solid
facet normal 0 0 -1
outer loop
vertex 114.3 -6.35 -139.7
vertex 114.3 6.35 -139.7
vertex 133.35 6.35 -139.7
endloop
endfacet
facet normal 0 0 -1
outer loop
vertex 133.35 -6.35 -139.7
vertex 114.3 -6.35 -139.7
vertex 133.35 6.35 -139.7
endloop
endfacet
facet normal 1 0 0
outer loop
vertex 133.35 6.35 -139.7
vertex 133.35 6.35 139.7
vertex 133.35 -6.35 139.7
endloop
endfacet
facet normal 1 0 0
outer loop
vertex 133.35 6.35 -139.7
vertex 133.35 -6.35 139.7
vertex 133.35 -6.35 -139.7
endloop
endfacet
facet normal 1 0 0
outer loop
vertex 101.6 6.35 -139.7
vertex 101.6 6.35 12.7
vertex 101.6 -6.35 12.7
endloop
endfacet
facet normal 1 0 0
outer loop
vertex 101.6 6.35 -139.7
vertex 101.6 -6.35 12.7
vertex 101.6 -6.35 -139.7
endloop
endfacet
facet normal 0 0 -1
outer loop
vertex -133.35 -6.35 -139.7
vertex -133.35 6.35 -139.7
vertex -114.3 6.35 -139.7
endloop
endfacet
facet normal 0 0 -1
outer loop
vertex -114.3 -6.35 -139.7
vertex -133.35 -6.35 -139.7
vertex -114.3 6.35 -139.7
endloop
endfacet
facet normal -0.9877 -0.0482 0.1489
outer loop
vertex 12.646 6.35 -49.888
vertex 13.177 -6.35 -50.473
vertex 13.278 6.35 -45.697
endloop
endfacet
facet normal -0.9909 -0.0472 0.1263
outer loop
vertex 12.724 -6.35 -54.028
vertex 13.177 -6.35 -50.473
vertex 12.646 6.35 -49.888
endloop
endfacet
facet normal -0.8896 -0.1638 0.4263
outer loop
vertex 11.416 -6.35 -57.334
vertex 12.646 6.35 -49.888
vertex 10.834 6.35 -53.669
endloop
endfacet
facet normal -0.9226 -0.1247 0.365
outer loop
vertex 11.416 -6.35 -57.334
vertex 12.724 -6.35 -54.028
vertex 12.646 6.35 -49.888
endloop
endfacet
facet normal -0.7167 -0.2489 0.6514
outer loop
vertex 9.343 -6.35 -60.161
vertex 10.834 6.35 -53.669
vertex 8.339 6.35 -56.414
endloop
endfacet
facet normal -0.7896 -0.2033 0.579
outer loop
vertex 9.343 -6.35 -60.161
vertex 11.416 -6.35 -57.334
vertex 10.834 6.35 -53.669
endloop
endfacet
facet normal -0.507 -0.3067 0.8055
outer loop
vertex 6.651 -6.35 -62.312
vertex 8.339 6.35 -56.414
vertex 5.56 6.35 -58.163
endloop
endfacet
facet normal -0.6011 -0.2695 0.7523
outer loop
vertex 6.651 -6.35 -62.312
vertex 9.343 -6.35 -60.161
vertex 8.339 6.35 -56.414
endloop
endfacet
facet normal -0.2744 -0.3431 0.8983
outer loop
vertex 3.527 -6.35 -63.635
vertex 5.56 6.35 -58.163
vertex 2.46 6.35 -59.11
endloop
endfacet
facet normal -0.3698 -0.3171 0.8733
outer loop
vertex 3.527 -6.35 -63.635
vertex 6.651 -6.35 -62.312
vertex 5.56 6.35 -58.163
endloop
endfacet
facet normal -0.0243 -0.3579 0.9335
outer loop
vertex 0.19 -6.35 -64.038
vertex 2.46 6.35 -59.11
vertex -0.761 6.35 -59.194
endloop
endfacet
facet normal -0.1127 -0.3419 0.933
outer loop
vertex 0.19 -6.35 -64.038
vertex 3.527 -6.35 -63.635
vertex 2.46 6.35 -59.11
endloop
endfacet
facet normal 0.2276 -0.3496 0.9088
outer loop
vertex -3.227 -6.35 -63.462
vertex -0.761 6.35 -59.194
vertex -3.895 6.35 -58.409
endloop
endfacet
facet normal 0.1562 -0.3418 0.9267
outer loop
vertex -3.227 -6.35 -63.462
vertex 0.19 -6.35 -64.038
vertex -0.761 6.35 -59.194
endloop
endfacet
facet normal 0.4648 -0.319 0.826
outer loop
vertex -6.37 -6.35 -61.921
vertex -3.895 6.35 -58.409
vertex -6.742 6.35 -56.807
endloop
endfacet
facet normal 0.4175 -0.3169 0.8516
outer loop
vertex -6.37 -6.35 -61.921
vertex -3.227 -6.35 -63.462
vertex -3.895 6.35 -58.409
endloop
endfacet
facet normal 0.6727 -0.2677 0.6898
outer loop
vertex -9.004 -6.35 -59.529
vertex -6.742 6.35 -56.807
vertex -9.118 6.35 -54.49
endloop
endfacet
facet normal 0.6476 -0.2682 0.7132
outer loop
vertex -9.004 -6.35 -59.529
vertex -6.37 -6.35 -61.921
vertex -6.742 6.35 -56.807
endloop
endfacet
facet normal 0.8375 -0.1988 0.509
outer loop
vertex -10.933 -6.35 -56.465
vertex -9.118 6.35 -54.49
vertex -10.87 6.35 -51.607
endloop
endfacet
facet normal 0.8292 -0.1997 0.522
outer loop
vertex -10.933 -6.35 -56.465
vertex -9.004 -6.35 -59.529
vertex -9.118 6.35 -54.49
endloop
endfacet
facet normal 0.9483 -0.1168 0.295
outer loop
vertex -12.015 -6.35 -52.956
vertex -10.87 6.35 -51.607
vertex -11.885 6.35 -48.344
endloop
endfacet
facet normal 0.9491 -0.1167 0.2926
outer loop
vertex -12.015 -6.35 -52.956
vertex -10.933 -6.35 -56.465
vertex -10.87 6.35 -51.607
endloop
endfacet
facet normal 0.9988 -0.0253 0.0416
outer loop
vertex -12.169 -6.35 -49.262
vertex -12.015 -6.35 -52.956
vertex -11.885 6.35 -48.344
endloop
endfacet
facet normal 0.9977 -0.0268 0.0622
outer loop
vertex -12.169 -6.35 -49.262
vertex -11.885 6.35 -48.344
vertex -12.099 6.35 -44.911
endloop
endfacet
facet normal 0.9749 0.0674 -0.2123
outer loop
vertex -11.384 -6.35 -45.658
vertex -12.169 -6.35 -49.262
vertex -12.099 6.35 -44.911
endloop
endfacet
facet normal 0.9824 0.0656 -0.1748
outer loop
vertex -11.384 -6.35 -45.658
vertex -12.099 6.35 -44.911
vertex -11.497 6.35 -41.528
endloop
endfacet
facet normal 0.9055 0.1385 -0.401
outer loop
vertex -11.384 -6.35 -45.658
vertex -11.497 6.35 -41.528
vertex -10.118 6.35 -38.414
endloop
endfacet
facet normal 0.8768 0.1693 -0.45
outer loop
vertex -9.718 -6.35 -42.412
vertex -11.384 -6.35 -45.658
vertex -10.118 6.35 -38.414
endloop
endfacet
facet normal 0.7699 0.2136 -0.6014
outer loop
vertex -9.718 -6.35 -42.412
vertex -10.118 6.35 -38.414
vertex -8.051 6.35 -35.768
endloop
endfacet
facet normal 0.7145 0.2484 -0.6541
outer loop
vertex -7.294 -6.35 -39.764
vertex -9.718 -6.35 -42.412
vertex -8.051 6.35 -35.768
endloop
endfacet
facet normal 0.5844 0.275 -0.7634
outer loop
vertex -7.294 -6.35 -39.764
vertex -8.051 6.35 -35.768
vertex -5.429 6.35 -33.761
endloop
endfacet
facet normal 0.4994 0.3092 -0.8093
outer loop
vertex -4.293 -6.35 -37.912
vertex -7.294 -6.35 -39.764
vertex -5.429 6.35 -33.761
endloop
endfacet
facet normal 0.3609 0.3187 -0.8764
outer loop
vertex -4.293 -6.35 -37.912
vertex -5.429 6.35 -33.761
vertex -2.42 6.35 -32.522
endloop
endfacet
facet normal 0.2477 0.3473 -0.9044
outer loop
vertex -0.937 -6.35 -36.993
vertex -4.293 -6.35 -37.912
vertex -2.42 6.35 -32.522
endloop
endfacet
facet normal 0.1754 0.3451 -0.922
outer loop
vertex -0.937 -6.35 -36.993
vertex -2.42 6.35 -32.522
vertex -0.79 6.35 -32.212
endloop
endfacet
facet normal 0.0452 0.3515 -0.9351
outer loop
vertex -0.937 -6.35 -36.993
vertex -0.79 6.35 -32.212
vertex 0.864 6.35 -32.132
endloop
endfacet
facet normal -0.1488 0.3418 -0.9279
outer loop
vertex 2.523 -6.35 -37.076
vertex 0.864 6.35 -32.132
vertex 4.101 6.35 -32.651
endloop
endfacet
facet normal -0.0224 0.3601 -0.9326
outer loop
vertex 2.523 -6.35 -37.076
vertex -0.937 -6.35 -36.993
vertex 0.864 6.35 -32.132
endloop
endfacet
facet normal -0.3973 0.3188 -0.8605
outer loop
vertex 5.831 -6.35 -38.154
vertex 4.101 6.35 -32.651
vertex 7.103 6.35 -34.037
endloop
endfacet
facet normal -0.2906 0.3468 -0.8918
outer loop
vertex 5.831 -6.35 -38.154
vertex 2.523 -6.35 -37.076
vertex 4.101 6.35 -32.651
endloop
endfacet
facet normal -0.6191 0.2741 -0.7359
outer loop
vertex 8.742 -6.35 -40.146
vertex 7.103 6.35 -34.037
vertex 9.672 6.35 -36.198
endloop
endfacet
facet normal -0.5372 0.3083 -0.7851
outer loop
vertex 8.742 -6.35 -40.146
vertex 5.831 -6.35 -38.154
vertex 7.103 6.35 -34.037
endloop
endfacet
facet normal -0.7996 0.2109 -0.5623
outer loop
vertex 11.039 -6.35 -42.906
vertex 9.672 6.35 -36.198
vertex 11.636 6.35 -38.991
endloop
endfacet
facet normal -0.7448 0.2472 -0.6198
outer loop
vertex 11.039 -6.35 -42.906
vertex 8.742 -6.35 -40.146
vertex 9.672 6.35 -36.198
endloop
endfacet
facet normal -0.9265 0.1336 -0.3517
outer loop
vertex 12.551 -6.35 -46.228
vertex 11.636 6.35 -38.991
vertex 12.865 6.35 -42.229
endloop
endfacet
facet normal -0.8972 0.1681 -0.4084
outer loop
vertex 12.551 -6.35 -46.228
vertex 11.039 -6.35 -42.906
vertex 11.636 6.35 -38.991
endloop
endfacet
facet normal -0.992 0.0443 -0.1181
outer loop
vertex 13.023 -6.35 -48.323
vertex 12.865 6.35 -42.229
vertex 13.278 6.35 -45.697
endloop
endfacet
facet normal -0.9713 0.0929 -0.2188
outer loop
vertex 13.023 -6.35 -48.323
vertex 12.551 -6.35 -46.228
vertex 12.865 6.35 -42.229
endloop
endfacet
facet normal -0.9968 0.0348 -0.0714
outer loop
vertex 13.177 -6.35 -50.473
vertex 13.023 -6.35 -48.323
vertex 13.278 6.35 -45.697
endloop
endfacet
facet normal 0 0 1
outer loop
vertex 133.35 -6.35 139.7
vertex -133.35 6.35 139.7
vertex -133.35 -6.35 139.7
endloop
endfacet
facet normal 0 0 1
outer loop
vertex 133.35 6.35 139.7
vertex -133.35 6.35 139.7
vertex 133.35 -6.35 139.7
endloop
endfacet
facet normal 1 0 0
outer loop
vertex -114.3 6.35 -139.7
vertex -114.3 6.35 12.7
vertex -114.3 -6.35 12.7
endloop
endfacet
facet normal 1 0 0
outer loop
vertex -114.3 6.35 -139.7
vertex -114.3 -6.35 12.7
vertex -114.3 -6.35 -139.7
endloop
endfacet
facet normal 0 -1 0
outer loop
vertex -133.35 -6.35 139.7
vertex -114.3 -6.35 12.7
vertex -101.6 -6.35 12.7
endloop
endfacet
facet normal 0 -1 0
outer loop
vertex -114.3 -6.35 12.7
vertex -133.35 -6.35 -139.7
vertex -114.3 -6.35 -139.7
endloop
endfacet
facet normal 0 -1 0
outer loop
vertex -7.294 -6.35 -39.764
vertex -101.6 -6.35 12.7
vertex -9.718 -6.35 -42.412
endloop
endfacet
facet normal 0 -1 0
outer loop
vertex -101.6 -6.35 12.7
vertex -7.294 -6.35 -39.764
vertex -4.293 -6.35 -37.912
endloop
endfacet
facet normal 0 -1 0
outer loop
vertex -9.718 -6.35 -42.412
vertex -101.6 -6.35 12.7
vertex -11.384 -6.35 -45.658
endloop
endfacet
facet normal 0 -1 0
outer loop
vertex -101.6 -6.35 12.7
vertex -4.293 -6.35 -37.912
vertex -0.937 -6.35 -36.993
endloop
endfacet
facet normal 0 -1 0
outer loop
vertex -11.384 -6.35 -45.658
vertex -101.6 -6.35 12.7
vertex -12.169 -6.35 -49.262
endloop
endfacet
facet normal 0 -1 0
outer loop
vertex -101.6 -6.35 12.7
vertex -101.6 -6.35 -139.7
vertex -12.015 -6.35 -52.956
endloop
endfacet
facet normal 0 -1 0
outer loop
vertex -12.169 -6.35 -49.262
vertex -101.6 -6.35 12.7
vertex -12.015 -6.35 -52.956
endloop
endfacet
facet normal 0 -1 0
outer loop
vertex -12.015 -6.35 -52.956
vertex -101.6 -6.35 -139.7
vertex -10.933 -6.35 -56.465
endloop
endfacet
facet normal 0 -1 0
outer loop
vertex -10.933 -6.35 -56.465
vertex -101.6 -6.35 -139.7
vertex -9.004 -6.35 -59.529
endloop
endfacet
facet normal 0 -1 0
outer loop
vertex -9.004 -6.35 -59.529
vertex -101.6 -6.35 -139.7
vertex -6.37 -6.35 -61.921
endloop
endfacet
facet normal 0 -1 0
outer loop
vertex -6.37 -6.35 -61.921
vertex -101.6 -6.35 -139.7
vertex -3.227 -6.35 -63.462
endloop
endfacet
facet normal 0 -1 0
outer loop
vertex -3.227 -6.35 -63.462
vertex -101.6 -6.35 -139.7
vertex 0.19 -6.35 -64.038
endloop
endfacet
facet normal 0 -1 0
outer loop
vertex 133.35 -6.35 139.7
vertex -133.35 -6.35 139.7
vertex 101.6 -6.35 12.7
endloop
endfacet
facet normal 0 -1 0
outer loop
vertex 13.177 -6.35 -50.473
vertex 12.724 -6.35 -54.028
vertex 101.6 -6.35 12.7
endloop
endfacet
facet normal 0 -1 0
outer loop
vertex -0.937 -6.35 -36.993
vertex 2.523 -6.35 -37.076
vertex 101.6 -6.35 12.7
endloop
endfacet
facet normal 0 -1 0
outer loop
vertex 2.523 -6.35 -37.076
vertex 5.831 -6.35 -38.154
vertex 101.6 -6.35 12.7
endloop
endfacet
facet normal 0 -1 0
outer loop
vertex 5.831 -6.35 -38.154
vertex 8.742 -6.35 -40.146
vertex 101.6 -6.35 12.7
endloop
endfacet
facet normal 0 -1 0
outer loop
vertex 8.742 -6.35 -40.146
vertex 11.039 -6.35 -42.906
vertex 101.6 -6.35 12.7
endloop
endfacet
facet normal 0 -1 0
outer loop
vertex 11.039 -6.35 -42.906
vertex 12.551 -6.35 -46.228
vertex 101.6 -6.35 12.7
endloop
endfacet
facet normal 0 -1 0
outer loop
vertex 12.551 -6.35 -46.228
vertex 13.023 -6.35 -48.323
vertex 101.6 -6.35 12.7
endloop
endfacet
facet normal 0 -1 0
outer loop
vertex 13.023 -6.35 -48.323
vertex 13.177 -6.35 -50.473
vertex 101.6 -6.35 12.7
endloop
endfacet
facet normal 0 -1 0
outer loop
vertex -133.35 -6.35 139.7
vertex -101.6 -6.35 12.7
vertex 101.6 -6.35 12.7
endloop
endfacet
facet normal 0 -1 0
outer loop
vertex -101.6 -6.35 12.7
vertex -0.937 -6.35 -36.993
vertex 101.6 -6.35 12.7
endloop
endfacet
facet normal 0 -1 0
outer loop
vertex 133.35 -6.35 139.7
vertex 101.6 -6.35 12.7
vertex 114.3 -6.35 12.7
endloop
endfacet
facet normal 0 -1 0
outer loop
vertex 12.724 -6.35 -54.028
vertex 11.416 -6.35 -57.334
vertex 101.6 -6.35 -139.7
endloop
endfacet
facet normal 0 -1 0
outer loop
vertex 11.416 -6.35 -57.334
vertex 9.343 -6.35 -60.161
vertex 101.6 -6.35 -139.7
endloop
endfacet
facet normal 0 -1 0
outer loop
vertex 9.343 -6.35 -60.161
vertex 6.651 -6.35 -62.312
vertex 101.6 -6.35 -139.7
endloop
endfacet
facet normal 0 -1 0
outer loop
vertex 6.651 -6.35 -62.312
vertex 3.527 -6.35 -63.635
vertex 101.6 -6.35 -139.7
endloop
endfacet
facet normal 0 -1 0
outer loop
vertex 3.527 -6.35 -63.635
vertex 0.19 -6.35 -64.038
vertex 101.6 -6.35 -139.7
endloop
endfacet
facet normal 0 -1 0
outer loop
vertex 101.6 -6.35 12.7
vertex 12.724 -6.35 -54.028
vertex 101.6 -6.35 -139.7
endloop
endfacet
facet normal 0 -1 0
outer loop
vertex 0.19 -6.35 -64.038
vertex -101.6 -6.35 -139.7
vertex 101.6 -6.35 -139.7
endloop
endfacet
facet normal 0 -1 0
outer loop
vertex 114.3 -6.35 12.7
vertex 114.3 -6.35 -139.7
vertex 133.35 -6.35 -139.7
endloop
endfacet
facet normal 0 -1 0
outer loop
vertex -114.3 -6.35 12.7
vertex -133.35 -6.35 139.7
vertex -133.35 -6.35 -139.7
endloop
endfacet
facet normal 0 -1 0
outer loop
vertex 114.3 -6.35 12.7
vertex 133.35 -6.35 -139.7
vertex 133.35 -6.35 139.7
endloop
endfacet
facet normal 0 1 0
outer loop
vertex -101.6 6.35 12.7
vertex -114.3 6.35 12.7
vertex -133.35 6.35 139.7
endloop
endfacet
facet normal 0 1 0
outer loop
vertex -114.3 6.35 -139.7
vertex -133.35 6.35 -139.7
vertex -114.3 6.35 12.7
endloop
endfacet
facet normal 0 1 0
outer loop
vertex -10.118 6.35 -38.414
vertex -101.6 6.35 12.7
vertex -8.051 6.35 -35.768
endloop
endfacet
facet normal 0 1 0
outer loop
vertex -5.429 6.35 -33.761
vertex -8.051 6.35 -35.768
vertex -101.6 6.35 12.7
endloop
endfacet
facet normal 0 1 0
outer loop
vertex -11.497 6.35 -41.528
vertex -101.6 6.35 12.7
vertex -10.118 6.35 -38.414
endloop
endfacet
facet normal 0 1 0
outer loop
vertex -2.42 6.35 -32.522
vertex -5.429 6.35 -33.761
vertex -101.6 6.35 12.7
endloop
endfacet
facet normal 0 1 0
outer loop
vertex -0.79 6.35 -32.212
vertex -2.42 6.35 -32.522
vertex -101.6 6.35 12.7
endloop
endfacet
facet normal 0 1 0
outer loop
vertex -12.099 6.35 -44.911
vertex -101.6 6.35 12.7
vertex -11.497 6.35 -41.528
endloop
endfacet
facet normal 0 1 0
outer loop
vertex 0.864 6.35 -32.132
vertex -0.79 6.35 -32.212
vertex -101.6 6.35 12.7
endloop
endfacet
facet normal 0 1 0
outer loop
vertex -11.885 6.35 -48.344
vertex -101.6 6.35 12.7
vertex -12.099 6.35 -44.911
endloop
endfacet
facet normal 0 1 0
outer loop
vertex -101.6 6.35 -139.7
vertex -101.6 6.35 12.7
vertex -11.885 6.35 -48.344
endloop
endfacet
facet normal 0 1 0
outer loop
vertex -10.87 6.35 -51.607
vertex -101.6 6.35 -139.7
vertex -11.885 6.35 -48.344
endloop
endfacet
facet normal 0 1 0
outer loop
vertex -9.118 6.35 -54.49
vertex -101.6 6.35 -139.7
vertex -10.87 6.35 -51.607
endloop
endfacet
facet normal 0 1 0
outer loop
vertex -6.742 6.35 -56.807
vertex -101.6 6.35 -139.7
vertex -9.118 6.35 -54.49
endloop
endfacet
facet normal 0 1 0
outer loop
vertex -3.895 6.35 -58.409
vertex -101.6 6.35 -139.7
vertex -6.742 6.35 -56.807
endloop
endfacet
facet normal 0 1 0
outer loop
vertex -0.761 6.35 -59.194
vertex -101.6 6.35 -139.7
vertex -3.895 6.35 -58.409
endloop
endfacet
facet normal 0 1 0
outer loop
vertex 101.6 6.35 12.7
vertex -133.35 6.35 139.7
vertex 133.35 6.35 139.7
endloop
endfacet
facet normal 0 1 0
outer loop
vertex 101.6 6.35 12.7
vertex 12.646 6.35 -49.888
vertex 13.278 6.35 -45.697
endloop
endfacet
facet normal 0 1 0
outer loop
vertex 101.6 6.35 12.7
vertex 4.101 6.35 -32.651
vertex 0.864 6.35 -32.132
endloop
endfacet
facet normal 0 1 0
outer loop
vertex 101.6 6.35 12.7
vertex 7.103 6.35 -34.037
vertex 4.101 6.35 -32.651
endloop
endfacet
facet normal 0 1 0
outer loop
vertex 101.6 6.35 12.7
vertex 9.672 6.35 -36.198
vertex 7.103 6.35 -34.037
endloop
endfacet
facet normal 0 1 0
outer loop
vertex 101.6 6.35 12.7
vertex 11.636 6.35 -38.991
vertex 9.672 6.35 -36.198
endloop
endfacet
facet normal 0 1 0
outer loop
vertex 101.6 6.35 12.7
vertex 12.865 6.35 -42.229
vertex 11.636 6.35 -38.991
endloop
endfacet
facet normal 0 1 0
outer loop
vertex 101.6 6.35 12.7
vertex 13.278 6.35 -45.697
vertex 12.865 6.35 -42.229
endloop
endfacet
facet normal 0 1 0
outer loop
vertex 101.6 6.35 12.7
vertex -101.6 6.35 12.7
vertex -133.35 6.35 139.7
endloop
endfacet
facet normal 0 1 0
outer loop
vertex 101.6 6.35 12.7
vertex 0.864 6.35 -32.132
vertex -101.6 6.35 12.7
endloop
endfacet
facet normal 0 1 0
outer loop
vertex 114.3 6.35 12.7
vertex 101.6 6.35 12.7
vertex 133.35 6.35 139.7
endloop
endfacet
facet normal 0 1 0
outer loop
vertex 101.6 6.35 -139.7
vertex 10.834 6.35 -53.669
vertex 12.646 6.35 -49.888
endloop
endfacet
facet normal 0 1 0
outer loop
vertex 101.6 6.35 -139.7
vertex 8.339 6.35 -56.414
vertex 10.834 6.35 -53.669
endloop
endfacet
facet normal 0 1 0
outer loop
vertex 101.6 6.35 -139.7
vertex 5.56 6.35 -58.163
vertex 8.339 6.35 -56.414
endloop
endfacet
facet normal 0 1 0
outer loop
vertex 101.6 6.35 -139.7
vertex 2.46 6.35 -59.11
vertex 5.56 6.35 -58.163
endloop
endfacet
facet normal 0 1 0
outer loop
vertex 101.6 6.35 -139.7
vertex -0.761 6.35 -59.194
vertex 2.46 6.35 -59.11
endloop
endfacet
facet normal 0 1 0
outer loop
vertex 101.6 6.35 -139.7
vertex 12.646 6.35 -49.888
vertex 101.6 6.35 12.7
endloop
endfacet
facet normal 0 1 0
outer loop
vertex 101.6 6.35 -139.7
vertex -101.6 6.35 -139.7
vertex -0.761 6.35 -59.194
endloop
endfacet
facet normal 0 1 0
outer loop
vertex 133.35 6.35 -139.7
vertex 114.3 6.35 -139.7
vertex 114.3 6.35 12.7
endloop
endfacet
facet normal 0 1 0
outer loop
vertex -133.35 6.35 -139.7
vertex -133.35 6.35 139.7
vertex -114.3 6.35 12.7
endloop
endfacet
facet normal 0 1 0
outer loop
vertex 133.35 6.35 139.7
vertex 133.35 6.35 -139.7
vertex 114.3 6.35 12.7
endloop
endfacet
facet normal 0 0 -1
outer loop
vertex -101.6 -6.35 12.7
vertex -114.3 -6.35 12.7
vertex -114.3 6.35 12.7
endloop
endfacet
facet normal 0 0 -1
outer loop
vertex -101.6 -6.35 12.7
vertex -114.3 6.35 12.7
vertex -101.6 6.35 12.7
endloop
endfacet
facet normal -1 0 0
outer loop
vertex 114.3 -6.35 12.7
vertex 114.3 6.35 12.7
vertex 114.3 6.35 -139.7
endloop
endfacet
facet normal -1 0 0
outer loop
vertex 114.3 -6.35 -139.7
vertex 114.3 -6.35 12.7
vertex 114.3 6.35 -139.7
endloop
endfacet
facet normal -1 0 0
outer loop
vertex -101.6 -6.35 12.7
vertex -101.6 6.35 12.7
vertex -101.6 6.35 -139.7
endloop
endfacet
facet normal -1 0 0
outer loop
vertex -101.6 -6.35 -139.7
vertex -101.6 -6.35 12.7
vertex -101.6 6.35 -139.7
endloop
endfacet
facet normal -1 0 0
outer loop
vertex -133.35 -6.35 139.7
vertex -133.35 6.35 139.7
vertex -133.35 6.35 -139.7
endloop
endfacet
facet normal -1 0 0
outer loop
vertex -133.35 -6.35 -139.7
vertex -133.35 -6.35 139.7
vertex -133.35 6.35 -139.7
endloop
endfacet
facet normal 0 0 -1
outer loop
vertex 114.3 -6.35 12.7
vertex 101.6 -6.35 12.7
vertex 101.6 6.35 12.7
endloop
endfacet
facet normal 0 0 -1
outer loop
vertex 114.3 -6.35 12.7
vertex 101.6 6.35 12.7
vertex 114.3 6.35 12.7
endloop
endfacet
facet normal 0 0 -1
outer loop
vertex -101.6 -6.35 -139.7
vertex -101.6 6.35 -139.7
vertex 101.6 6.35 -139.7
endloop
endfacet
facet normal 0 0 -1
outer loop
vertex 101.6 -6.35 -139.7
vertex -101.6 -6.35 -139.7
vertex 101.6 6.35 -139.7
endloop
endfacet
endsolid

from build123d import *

# Parameters (mm, degrees)
SKETCH1_W           = 330.2
SKETCH1_H           = 279.4
BOSS_EXTRUDE1_DEPTH = 6.35
SKETCH2_W           = 12.7
SKETCH2_H           = 152.4
CUT_EXTRUDE1_DEPTH  = 217.645770787
SKETCH4_W           = 31.75
SKETCH4_H           = 279.4
CUT_EXTRUDE3_DEPTH  = 217.645770787
CAVITY1_START       = -28.48121296
CAVITY1_OUTLINE_R   = 12.7
CAVITY1_DEPTH       = 23.121998378


# Read off the part's stored shape, not the designer's step: Cavity1
with BuildPart() as part:
    # Sketch1 → Boss-Extrude1 (new, symmetric)
    with BuildSketch(Plane(origin=(0, 0, 0), x_dir=(1, 0, 0), z_dir=(0, 1, 0))):
        Rectangle(SKETCH1_W, SKETCH1_H)
    extrude(amount=BOSS_EXTRUDE1_DEPTH, both=True)

    # Sketch2 → Cut-Extrude1 (cut, through all)
    with BuildSketch(Plane(origin=(0, 6.35, 0), x_dir=(1, 0, 0), z_dir=(0, 1, 0))):
        with Locations((-107.95, 63.5)):
            Rectangle(SKETCH2_W, SKETCH2_H)
        with Locations((107.95, 63.5)):
            Rectangle(SKETCH2_W, SKETCH2_H)
    extrude(amount=-CUT_EXTRUDE1_DEPTH, mode=Mode.SUBTRACT)

    # Sketch4 → Cut-Extrude3 (cut, through all)
    with BuildSketch(Plane(origin=(0, 6.35, 0), x_dir=(1, 0, 0), z_dir=(0, 1, 0))):
        with Locations((-149.225, 0)):
            Rectangle(SKETCH4_W, SKETCH4_H)
        with Locations((149.225, 0)):
            Rectangle(SKETCH4_W, SKETCH4_H)
    extrude(amount=-CUT_EXTRUDE3_DEPTH, mode=Mode.SUBTRACT)

    # Cavity1 outline → Cavity1 (cut)
    with BuildSketch(Plane(origin=(0, 0, 0), x_dir=(0.999972352848875, -0.006960139267425278, -0.0026172503248496305), z_dir=(0.007435962471992497, 0.9359846644758757, 0.3519622342355749)).offset(CAVITY1_START)):
        with Locations((0.653273782, 45.008151356)):
            Circle(CAVITY1_OUTLINE_R)
    extrude(amount=CAVITY1_DEPTH, mode=Mode.SUBTRACT)


solid = part.part
